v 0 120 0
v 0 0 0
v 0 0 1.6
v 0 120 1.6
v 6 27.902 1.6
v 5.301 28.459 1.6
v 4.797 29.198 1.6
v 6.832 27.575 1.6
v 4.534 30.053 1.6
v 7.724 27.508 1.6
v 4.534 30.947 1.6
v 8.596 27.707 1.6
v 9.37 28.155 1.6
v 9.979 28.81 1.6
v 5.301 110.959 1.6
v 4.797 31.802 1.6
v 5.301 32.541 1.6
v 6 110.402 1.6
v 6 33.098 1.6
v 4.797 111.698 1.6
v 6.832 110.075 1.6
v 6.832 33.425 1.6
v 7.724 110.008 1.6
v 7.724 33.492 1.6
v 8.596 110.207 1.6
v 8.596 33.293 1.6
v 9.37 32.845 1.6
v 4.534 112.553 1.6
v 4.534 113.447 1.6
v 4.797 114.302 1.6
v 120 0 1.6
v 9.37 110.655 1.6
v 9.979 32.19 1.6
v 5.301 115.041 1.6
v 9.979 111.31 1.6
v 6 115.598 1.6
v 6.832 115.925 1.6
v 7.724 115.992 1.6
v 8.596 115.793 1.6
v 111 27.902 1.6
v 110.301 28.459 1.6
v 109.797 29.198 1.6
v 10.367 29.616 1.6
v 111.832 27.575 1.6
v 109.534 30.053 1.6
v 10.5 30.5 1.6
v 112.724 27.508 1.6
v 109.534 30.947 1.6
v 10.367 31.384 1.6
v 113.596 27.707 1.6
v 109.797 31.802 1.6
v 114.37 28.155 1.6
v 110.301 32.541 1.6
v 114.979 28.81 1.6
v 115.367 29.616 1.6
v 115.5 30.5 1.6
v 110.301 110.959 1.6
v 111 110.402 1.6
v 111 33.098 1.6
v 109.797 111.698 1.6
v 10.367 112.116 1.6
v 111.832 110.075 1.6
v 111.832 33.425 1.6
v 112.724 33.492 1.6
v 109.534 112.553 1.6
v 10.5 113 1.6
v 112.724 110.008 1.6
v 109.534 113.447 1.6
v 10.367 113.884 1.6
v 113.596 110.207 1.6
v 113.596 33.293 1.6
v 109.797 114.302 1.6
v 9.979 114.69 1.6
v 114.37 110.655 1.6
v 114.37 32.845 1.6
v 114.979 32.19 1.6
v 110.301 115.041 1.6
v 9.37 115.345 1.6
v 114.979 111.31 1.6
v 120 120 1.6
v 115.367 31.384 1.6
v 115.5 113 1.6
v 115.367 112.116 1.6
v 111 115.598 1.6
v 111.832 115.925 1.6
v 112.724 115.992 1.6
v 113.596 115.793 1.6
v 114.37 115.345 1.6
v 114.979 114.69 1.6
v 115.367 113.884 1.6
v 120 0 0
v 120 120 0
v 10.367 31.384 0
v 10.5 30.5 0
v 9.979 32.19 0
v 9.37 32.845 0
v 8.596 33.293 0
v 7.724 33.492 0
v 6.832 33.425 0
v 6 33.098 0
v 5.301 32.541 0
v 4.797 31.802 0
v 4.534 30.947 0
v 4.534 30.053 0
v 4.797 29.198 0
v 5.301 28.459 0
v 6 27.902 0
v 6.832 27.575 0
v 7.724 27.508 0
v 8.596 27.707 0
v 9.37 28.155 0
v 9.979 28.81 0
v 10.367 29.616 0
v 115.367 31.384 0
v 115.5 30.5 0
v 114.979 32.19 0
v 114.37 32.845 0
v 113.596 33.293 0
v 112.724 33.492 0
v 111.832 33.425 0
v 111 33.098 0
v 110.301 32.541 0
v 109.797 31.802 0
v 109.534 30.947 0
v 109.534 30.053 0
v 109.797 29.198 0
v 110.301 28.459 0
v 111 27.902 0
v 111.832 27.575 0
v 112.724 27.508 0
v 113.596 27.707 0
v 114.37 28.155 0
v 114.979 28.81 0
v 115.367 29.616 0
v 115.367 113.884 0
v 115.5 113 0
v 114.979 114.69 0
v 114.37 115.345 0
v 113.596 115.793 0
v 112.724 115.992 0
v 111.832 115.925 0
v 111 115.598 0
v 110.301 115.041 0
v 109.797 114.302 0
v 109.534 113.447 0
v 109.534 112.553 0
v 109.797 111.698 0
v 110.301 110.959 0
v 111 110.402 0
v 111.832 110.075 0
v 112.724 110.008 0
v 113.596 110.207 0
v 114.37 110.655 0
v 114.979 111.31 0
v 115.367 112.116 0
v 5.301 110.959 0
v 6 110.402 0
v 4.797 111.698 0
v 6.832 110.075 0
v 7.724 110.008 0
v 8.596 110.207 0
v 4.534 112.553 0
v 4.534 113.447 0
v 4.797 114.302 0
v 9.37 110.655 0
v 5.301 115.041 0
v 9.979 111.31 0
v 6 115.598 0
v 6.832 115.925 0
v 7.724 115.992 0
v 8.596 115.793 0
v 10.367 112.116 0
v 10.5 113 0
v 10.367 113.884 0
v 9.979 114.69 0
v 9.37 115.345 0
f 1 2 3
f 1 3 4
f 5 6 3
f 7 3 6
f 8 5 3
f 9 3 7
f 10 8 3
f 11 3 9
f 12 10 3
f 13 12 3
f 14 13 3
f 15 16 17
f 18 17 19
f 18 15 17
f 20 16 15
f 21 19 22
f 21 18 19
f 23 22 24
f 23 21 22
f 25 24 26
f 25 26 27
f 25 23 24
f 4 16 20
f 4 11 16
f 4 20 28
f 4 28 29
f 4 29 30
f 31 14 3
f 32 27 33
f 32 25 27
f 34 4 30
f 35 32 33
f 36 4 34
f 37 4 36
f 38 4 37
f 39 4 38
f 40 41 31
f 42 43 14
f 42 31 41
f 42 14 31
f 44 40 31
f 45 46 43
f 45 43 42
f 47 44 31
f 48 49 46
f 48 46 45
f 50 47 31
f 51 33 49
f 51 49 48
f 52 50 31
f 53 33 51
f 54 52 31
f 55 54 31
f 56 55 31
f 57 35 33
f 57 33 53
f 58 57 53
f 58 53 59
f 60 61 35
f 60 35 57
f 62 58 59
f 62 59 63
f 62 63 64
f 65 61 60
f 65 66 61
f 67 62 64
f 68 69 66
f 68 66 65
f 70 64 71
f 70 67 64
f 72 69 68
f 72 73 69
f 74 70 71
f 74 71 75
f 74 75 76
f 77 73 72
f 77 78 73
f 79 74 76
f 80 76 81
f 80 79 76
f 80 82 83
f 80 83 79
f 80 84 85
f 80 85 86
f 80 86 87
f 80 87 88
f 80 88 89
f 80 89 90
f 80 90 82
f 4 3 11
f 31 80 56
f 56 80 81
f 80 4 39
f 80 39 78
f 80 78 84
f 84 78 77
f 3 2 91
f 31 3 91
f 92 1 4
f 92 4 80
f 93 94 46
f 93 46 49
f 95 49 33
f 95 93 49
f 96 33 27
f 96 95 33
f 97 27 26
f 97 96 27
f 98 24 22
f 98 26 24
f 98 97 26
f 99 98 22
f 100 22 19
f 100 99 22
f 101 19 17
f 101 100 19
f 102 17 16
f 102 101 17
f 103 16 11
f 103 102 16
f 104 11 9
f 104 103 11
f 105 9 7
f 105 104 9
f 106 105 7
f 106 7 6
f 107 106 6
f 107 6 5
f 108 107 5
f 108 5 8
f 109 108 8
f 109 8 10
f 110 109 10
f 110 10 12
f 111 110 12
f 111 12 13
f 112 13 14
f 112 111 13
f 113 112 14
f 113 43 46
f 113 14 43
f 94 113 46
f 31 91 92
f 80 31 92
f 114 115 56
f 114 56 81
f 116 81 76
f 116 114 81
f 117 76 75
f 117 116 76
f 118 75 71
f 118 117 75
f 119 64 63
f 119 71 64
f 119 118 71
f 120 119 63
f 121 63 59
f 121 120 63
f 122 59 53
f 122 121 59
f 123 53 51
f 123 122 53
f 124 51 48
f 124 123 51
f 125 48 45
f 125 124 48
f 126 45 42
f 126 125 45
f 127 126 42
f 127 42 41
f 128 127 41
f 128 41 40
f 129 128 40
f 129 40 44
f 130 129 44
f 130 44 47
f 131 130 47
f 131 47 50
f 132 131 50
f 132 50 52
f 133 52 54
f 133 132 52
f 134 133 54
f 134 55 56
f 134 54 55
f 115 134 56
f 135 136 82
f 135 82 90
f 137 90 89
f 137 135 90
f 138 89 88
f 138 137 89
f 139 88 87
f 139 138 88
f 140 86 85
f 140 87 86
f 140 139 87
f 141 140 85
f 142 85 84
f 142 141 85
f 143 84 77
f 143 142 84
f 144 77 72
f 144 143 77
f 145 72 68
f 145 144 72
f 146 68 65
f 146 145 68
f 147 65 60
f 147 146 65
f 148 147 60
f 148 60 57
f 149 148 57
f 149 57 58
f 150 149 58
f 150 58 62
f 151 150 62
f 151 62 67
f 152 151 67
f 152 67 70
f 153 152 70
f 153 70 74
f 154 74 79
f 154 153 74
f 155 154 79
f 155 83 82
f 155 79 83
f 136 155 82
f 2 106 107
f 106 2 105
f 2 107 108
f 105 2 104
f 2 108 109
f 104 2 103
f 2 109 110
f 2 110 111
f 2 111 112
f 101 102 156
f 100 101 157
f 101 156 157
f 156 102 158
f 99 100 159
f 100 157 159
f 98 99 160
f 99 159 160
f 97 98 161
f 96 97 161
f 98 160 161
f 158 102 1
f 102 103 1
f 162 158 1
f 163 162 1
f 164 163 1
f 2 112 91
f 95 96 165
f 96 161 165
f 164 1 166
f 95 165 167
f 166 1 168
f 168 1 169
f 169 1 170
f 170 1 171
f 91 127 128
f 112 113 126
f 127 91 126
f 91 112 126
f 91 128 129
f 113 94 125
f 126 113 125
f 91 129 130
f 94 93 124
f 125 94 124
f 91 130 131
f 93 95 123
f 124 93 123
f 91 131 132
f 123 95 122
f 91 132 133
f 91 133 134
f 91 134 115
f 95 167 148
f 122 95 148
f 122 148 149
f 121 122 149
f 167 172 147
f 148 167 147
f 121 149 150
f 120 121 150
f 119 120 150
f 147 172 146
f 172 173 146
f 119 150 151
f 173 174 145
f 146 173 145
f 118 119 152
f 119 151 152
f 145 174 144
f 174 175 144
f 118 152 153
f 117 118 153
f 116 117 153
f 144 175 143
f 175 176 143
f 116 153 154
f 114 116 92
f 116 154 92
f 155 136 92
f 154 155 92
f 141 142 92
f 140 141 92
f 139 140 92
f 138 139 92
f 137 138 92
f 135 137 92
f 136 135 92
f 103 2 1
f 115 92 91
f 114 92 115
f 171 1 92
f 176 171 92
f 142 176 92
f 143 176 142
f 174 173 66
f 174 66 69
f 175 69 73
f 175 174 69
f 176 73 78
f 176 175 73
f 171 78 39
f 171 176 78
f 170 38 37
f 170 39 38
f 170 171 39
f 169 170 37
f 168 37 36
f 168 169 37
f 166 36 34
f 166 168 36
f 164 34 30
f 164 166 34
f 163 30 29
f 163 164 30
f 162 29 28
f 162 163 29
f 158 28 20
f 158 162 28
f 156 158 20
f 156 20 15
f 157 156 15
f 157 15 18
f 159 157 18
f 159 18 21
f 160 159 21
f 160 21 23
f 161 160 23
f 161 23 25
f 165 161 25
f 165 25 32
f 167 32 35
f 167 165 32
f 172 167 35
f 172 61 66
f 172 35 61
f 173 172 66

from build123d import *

# Parameters (mm, degrees)
CYLINDER_R     = 3
CYLINDER_DEPTH = 10
BOX_W          = 120
BOX_H          = 120
BOX_DEPTH      = 1.6


with BuildPart() as cylinder:
    # Cylinder → Cylinder (new body)
    with BuildSketch(Plane(origin=(7.5, 30.5, -5), x_dir=(1, 0, 0), z_dir=(0, 0, 1))):
        Circle(CYLINDER_R)
    extrude(amount=CYLINDER_DEPTH)


with BuildPart() as clone_of_cylinder001:
    # Clone001 base: copy of Cylinder
    add(cylinder.part)


with BuildPart() as clone_of_cylinder001_1:
    # Clone001 placement: moved
    add(clone_of_cylinder001.part.moved(Location((105, 0, 0))))


with BuildPart() as clone_of_cylinder:
    # Clone base: copy of Cylinder
    add(cylinder.part)


with BuildPart() as clone_of_cylinder_1:
    # Clone placement: moved
    add(clone_of_cylinder.part.moved(Location((0, 82.5, 0))))


with BuildPart() as clone_of_cylinder002:
    # Clone002 base: copy of Cylinder
    add(cylinder.part)


with BuildPart() as clone_of_cylinder002_1:
    # Clone002 placement: moved
    add(clone_of_cylinder002.part.moved(Location((105, 82.5, 0))))


with BuildPart() as fusion:
    # Fusion base: copy of Cylinder
    add(cylinder.part)

    # Fusion: union Clone of Cylinder001, Clone of Cylinder, Clone of Cylinder002
    add(clone_of_cylinder001_1.part)
    add(clone_of_cylinder_1.part)
    add(clone_of_cylinder002_1.part)


with BuildPart() as board:
    # Box → Box (new body)
    with BuildSketch(Plane.XY):
        with Locations((60, 60)):
            Rectangle(BOX_W, BOX_H)
    extrude(amount=BOX_DEPTH)

    # Cut: cut Fusion
    add(fusion.part, mode=Mode.SUBTRACT)


solid = board.part
